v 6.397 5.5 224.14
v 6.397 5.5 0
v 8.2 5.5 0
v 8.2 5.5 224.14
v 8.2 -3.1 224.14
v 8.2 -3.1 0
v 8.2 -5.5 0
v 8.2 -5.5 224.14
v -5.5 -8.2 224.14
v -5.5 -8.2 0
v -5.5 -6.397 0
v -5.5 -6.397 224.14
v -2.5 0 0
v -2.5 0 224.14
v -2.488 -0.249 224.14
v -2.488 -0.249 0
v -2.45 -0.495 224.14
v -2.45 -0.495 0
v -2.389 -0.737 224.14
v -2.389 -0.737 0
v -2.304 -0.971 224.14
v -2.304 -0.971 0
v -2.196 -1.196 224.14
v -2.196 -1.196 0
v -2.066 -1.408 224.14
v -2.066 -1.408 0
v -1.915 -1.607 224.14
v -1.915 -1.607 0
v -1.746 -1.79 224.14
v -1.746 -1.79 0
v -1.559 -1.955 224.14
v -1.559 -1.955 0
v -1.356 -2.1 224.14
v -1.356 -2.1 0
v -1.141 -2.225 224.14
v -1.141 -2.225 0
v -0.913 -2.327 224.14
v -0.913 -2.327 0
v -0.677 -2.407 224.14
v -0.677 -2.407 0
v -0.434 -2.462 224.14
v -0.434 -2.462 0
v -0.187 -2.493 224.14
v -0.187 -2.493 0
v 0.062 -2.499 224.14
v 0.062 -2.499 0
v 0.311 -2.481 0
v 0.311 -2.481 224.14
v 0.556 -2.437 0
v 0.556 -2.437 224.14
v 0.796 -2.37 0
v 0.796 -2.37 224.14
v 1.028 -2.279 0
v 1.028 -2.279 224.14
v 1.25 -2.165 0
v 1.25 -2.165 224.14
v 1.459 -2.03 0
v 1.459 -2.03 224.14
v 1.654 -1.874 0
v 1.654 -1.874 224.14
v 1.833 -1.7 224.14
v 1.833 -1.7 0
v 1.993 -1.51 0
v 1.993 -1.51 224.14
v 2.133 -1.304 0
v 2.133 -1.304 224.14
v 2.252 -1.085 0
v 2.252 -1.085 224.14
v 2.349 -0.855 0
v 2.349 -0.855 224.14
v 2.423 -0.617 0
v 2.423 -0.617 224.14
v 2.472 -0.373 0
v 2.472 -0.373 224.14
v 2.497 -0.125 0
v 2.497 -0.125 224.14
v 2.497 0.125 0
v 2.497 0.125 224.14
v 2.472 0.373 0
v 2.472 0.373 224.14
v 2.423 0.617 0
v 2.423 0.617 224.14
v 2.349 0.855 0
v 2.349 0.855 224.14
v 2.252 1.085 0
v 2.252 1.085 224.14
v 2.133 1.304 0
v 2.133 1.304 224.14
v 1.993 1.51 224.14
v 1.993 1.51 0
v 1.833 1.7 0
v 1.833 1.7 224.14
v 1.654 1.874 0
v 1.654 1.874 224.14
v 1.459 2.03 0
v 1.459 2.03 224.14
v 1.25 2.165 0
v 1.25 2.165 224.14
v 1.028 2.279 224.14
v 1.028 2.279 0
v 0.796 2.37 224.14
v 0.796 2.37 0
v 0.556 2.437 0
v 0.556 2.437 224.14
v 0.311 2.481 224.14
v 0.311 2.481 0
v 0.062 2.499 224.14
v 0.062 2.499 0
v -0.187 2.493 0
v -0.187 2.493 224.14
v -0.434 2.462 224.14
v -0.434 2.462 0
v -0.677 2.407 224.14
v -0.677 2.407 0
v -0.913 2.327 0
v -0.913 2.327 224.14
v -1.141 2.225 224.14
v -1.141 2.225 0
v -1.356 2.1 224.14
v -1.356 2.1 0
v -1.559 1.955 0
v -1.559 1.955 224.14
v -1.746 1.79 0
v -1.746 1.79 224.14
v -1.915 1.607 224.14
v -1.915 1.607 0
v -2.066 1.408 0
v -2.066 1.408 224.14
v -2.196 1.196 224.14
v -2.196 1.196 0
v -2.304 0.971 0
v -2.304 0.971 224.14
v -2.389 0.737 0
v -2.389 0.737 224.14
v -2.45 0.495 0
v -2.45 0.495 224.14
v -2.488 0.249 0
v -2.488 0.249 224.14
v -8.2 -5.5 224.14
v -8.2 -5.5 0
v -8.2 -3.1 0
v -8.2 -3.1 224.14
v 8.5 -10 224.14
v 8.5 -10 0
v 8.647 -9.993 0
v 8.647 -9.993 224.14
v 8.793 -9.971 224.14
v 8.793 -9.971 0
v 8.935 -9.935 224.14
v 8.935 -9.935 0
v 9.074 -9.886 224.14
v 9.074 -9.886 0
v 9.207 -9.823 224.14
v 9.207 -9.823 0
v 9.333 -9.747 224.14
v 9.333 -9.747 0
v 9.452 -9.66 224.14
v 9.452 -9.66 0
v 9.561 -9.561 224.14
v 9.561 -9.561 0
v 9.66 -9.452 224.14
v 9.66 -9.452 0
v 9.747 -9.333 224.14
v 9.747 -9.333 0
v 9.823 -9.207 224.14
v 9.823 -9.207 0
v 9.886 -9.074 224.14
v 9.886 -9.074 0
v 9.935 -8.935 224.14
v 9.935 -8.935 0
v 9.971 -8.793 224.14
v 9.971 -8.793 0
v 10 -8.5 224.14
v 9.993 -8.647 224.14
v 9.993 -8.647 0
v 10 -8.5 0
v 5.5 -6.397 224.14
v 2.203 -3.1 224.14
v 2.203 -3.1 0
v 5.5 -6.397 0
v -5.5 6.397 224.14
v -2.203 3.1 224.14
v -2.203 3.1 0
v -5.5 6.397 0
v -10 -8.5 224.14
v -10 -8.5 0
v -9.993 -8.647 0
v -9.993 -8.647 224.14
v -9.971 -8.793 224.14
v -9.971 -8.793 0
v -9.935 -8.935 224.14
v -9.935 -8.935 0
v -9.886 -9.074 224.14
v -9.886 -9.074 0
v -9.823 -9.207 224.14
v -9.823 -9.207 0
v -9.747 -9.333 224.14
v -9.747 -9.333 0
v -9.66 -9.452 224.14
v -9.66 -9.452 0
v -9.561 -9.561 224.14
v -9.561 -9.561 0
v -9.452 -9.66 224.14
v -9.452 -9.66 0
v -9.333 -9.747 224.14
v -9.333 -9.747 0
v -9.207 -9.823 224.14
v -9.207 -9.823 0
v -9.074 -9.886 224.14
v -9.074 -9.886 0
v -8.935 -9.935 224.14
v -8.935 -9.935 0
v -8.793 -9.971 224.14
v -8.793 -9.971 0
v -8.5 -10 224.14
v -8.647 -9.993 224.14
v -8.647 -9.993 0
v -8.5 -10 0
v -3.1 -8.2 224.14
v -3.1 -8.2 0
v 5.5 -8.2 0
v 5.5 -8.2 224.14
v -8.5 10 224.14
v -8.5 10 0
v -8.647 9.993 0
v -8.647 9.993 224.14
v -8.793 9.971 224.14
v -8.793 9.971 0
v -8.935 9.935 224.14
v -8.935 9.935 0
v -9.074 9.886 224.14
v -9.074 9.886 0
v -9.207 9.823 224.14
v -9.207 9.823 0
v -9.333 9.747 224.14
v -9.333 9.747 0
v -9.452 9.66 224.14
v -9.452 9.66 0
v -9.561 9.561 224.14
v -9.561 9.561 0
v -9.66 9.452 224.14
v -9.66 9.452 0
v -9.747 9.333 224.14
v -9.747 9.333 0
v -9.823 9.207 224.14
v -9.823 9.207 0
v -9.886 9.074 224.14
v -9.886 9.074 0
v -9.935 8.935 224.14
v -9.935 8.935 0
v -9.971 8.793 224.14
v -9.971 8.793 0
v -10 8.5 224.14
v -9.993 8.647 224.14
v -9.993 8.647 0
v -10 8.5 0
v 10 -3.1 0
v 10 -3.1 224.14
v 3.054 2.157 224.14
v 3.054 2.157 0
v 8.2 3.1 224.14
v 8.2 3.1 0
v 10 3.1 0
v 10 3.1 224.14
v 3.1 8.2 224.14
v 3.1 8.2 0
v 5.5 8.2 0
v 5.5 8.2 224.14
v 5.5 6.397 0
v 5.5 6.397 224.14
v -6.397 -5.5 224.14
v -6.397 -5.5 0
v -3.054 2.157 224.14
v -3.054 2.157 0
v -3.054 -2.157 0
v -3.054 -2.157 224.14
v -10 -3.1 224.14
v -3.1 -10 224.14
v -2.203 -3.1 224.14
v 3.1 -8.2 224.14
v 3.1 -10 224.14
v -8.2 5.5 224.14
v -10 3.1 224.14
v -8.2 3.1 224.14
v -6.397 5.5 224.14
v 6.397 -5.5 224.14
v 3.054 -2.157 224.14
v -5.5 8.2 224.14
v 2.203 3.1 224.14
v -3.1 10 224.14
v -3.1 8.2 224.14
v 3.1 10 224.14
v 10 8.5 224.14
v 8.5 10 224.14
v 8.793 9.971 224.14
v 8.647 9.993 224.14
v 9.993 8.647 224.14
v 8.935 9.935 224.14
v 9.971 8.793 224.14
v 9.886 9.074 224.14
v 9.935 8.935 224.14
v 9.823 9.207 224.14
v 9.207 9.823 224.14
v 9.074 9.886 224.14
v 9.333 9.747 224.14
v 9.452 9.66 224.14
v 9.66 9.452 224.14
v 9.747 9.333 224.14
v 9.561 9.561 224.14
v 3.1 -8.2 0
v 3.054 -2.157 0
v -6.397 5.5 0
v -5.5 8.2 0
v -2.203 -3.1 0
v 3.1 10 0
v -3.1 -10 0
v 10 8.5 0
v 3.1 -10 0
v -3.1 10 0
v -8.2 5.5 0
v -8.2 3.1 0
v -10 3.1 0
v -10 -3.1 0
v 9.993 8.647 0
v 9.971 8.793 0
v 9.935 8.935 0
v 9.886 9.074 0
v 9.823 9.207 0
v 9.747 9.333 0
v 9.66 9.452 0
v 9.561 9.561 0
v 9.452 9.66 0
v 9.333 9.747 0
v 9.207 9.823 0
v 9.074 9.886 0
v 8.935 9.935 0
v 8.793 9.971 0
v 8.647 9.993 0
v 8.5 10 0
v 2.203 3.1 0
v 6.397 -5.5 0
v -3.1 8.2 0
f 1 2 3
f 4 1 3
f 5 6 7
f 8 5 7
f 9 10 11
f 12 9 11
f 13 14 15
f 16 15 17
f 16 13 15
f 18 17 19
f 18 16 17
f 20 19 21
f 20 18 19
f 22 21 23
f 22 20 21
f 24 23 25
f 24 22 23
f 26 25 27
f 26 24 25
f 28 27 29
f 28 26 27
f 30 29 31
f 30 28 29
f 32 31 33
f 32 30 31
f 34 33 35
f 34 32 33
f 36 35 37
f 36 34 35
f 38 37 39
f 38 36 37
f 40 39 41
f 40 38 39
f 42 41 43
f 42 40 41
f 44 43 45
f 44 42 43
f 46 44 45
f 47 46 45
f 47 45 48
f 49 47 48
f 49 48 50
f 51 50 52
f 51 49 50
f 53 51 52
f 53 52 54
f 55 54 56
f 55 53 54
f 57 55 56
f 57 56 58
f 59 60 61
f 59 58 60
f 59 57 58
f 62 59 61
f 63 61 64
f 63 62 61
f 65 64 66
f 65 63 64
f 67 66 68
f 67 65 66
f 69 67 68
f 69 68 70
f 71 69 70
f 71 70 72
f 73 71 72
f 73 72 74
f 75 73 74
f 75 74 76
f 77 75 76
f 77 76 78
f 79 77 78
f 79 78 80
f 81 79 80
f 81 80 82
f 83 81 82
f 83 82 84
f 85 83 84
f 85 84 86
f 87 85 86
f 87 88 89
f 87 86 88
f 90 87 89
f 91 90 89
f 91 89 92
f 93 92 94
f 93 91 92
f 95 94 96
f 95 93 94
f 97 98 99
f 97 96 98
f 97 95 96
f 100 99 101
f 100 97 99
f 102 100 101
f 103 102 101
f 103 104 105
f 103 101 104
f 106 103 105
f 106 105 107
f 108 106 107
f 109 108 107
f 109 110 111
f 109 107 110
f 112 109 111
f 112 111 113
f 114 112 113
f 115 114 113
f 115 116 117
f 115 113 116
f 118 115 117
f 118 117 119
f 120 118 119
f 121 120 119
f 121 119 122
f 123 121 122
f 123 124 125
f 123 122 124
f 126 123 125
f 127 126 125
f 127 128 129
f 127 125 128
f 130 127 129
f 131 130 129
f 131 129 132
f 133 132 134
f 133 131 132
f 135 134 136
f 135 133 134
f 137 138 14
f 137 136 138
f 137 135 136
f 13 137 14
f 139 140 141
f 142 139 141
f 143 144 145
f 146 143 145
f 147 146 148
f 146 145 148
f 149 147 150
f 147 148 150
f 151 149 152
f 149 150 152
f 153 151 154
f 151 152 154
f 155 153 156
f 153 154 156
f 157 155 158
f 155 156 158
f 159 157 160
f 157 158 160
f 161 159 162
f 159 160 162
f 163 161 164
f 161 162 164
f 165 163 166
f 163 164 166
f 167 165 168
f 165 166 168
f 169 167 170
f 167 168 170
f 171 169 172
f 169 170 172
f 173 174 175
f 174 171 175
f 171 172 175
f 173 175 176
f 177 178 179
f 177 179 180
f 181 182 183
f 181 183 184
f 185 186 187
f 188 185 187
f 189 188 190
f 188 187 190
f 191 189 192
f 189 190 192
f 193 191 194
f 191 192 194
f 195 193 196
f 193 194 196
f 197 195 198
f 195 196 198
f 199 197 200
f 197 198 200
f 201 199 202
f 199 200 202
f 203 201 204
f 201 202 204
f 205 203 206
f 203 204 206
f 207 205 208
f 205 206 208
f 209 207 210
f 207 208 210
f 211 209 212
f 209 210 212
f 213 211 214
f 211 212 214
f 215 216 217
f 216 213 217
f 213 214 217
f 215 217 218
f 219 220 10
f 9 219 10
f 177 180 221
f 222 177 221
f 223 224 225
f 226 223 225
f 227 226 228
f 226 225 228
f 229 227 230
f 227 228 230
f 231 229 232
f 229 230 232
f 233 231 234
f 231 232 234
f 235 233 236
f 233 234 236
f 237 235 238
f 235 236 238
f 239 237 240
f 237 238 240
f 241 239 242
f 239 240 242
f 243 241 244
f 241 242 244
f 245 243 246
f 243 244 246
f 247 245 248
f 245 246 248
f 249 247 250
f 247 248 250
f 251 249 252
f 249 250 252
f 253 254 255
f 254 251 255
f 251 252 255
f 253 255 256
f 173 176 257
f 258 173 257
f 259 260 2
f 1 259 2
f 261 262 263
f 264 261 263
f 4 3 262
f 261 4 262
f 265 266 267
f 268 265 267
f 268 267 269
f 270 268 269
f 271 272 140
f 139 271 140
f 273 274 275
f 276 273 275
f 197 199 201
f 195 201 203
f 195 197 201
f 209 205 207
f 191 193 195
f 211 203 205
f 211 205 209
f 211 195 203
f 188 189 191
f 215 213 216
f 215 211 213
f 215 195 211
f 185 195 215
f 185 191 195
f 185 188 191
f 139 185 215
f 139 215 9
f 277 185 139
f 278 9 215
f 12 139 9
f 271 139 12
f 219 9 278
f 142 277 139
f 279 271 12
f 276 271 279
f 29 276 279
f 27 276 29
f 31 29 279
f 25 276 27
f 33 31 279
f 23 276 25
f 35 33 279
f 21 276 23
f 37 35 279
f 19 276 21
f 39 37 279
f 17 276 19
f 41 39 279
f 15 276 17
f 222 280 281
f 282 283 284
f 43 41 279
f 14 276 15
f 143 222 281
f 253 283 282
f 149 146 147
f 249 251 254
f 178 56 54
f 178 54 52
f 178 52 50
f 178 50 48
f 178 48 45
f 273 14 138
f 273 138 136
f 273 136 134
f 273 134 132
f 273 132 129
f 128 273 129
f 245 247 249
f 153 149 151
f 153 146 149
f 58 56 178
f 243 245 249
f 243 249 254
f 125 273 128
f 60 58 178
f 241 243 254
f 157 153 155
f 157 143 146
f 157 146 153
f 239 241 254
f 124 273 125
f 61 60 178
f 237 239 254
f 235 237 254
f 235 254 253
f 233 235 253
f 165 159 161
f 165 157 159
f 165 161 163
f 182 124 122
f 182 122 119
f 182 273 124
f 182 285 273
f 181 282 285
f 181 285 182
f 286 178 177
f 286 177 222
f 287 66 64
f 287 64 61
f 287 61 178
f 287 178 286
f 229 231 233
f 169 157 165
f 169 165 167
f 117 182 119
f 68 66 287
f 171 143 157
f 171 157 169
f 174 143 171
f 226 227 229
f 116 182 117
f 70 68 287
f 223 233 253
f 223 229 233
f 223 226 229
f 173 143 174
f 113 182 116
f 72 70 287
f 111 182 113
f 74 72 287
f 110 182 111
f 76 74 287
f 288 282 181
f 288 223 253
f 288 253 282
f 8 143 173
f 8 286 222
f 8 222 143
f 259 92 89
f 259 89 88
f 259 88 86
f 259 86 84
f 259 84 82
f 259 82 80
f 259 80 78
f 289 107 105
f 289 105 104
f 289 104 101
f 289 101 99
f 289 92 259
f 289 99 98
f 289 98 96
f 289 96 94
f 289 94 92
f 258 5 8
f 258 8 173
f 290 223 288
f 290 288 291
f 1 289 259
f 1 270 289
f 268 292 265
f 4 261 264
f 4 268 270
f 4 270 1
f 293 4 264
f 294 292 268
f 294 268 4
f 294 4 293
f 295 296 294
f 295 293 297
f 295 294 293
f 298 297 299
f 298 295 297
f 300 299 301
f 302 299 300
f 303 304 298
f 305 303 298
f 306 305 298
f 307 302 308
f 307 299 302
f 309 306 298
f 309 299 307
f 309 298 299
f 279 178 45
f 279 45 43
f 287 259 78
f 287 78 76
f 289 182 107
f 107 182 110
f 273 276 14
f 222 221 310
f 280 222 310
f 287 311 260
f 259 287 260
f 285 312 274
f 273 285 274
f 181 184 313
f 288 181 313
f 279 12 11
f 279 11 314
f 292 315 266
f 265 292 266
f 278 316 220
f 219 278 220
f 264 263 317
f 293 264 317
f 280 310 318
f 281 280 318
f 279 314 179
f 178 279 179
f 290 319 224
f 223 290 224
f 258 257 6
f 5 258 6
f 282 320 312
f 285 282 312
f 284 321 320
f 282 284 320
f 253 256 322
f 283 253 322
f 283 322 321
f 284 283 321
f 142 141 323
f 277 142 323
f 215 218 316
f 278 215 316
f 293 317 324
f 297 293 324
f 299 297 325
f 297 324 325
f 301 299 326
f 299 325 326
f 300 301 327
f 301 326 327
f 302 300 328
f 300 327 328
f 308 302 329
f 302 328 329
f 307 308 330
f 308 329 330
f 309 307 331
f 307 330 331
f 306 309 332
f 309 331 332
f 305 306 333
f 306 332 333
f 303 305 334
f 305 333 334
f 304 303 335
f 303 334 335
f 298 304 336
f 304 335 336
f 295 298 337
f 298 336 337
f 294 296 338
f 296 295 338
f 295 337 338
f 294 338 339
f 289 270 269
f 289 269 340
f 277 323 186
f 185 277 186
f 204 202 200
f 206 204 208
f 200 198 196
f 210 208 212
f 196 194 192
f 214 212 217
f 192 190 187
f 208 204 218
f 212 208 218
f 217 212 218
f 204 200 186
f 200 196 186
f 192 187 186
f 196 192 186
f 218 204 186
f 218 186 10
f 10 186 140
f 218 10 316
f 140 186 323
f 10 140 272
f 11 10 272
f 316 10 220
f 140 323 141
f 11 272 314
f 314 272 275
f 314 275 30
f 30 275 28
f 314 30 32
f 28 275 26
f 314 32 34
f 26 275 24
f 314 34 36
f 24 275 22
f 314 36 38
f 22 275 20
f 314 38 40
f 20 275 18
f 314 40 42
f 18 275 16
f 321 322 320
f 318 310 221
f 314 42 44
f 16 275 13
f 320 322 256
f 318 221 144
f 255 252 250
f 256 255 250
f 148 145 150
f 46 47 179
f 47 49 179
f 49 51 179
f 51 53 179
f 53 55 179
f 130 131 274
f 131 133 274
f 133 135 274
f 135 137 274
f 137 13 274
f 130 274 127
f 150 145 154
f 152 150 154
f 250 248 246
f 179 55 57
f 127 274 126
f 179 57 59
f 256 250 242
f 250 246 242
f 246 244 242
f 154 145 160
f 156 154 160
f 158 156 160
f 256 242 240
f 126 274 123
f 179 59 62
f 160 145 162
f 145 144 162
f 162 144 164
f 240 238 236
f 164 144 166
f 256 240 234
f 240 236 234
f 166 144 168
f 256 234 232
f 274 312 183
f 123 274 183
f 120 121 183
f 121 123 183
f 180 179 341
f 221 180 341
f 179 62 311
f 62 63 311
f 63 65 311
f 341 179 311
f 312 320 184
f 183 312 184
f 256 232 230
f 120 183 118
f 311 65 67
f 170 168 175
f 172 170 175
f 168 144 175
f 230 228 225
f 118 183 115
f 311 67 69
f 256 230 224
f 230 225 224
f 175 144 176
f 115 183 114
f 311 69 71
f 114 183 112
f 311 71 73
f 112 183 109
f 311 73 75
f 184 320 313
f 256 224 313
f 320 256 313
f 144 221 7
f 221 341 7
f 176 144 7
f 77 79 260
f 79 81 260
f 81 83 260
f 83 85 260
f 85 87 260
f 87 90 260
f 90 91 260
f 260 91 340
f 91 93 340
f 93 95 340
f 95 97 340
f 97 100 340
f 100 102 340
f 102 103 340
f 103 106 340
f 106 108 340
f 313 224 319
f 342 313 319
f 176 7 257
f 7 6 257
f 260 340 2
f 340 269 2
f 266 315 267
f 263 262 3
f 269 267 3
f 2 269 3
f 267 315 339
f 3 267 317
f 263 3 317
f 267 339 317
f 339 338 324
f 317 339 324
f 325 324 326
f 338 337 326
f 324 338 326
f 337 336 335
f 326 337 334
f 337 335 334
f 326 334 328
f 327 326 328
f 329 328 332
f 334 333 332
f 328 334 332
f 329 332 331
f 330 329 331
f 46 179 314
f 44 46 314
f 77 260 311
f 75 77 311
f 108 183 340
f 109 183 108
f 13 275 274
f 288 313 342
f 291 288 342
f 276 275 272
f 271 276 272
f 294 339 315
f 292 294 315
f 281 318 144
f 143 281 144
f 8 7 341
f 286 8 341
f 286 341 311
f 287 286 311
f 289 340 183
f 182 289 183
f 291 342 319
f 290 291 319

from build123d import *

# Parameters (mm, degrees)
SKETCH_1_R          = 2.5
EXTRUDE_1_DEPTH     = 950
SKETCH_2_W          = 109.948268043
SKETCH_2_H          = 29.443949836
CUT_EXTRUDE_1_DEPTH = 725.86


with BuildPart() as part:
    # 草图1 → 凸台-拉伸1 (new body)
    with BuildSketch(Plane.XY):
        with BuildLine():
            Line((-8.2, -3.1), (-10, -3.1))
            Line((-10, -3.1), (-10, -8.5))
            ThreePointArc((-10, -8.5), (-9.560660172, -9.560660172), (-8.5, -10))
            Line((-8.5, -10), (-3.1, -10))
            Line((-3.1, -10), (-3.1, -8.2))
            Line((-3.1, -8.2), (-5.5, -8.2))
            Line((-5.5, -8.2), (-5.5, -6.397050155))
            Line((-5.5, -6.397050155), (-2.202949845, -3.1))
            Line((-2.202949845, -3.1), (2.202949845, -3.1))
            Line((2.202949845, -3.1), (5.5, -6.397050155))
            Line((5.5, -6.397050155), (5.5, -8.2))
            Line((5.5, -8.2), (3.1, -8.2))
            Line((3.1, -8.2), (3.1, -10))
            Line((3.1, -10), (8.5, -10))
            ThreePointArc((8.5, -10), (9.560660172, -9.560660172), (10, -8.5))
            Line((10, -8.5), (10, -3.1))
            Line((10, -3.1), (8.2, -3.1))
            Line((8.2, -3.1), (8.2, -5.5))
            Line((8.2, -5.5), (6.397050155, -5.5))
            Line((6.397050155, -5.5), (3.05412702, -2.157076865))
            Line((3.05412702, -2.157076865), (3.05412702, 2.157076865))
            Line((3.05412702, 2.157076865), (6.397050155, 5.5))
            Line((6.397050155, 5.5), (8.2, 5.5))
            Line((8.2, 5.5), (8.2, 3.1))
            Line((8.2, 3.1), (10, 3.1))
            Line((10, 3.1), (10, 8.5))
            ThreePointArc((10, 8.5), (9.560660172, 9.560660172), (8.5, 10))
            Line((8.5, 10), (3.1, 10))
            Line((3.1, 10), (3.1, 8.2))
            Line((3.1, 8.2), (5.5, 8.2))
            Line((5.5, 8.2), (5.5, 6.397050155))
            Line((5.5, 6.397050155), (2.202949845, 3.1))
            Line((2.202949845, 3.1), (-2.202949845, 3.1))
            Line((-2.202949845, 3.1), (-5.5, 6.397050155))
            Line((-5.5, 6.397050155), (-5.5, 8.2))
            Line((-5.5, 8.2), (-3.1, 8.2))
            Line((-3.1, 8.2), (-3.1, 10))
            Line((-3.1, 10), (-8.5, 10))
            ThreePointArc((-8.5, 10), (-9.560660172, 9.560660172), (-10, 8.5))
            Line((-10, 8.5), (-10, 3.1))
            Line((-10, 3.1), (-8.2, 3.1))
            Line((-8.2, 3.1), (-8.2, 5.5))
            Line((-8.2, 5.5), (-6.397050155, 5.5))
            Line((-6.397050155, 5.5), (-3.05412702, 2.157076865))
            Line((-3.05412702, 2.157076865), (-3.05412702, -2.157076865))
            Line((-3.05412702, -2.157076865), (-6.397050155, -5.5))
            Line((-6.397050155, -5.5), (-8.2, -5.5))
            Line((-8.2, -5.5), (-8.2, -3.1))
        make_face()
        with Locations(Location((0, 0, 0), (0, 0, 180))):
            Circle(SKETCH_1_R, mode=Mode.SUBTRACT)
    extrude(amount=EXTRUDE_1_DEPTH)

    # 草图2 → 切除-拉伸1 (cut)
    with BuildSketch(Plane.XY.offset(950)):
        with Locations((27.511129311, -2.182282155)):
            Rectangle(SKETCH_2_W, SKETCH_2_H)
    extrude(amount=-CUT_EXTRUDE_1_DEPTH, mode=Mode.SUBTRACT)


solid = part.part
